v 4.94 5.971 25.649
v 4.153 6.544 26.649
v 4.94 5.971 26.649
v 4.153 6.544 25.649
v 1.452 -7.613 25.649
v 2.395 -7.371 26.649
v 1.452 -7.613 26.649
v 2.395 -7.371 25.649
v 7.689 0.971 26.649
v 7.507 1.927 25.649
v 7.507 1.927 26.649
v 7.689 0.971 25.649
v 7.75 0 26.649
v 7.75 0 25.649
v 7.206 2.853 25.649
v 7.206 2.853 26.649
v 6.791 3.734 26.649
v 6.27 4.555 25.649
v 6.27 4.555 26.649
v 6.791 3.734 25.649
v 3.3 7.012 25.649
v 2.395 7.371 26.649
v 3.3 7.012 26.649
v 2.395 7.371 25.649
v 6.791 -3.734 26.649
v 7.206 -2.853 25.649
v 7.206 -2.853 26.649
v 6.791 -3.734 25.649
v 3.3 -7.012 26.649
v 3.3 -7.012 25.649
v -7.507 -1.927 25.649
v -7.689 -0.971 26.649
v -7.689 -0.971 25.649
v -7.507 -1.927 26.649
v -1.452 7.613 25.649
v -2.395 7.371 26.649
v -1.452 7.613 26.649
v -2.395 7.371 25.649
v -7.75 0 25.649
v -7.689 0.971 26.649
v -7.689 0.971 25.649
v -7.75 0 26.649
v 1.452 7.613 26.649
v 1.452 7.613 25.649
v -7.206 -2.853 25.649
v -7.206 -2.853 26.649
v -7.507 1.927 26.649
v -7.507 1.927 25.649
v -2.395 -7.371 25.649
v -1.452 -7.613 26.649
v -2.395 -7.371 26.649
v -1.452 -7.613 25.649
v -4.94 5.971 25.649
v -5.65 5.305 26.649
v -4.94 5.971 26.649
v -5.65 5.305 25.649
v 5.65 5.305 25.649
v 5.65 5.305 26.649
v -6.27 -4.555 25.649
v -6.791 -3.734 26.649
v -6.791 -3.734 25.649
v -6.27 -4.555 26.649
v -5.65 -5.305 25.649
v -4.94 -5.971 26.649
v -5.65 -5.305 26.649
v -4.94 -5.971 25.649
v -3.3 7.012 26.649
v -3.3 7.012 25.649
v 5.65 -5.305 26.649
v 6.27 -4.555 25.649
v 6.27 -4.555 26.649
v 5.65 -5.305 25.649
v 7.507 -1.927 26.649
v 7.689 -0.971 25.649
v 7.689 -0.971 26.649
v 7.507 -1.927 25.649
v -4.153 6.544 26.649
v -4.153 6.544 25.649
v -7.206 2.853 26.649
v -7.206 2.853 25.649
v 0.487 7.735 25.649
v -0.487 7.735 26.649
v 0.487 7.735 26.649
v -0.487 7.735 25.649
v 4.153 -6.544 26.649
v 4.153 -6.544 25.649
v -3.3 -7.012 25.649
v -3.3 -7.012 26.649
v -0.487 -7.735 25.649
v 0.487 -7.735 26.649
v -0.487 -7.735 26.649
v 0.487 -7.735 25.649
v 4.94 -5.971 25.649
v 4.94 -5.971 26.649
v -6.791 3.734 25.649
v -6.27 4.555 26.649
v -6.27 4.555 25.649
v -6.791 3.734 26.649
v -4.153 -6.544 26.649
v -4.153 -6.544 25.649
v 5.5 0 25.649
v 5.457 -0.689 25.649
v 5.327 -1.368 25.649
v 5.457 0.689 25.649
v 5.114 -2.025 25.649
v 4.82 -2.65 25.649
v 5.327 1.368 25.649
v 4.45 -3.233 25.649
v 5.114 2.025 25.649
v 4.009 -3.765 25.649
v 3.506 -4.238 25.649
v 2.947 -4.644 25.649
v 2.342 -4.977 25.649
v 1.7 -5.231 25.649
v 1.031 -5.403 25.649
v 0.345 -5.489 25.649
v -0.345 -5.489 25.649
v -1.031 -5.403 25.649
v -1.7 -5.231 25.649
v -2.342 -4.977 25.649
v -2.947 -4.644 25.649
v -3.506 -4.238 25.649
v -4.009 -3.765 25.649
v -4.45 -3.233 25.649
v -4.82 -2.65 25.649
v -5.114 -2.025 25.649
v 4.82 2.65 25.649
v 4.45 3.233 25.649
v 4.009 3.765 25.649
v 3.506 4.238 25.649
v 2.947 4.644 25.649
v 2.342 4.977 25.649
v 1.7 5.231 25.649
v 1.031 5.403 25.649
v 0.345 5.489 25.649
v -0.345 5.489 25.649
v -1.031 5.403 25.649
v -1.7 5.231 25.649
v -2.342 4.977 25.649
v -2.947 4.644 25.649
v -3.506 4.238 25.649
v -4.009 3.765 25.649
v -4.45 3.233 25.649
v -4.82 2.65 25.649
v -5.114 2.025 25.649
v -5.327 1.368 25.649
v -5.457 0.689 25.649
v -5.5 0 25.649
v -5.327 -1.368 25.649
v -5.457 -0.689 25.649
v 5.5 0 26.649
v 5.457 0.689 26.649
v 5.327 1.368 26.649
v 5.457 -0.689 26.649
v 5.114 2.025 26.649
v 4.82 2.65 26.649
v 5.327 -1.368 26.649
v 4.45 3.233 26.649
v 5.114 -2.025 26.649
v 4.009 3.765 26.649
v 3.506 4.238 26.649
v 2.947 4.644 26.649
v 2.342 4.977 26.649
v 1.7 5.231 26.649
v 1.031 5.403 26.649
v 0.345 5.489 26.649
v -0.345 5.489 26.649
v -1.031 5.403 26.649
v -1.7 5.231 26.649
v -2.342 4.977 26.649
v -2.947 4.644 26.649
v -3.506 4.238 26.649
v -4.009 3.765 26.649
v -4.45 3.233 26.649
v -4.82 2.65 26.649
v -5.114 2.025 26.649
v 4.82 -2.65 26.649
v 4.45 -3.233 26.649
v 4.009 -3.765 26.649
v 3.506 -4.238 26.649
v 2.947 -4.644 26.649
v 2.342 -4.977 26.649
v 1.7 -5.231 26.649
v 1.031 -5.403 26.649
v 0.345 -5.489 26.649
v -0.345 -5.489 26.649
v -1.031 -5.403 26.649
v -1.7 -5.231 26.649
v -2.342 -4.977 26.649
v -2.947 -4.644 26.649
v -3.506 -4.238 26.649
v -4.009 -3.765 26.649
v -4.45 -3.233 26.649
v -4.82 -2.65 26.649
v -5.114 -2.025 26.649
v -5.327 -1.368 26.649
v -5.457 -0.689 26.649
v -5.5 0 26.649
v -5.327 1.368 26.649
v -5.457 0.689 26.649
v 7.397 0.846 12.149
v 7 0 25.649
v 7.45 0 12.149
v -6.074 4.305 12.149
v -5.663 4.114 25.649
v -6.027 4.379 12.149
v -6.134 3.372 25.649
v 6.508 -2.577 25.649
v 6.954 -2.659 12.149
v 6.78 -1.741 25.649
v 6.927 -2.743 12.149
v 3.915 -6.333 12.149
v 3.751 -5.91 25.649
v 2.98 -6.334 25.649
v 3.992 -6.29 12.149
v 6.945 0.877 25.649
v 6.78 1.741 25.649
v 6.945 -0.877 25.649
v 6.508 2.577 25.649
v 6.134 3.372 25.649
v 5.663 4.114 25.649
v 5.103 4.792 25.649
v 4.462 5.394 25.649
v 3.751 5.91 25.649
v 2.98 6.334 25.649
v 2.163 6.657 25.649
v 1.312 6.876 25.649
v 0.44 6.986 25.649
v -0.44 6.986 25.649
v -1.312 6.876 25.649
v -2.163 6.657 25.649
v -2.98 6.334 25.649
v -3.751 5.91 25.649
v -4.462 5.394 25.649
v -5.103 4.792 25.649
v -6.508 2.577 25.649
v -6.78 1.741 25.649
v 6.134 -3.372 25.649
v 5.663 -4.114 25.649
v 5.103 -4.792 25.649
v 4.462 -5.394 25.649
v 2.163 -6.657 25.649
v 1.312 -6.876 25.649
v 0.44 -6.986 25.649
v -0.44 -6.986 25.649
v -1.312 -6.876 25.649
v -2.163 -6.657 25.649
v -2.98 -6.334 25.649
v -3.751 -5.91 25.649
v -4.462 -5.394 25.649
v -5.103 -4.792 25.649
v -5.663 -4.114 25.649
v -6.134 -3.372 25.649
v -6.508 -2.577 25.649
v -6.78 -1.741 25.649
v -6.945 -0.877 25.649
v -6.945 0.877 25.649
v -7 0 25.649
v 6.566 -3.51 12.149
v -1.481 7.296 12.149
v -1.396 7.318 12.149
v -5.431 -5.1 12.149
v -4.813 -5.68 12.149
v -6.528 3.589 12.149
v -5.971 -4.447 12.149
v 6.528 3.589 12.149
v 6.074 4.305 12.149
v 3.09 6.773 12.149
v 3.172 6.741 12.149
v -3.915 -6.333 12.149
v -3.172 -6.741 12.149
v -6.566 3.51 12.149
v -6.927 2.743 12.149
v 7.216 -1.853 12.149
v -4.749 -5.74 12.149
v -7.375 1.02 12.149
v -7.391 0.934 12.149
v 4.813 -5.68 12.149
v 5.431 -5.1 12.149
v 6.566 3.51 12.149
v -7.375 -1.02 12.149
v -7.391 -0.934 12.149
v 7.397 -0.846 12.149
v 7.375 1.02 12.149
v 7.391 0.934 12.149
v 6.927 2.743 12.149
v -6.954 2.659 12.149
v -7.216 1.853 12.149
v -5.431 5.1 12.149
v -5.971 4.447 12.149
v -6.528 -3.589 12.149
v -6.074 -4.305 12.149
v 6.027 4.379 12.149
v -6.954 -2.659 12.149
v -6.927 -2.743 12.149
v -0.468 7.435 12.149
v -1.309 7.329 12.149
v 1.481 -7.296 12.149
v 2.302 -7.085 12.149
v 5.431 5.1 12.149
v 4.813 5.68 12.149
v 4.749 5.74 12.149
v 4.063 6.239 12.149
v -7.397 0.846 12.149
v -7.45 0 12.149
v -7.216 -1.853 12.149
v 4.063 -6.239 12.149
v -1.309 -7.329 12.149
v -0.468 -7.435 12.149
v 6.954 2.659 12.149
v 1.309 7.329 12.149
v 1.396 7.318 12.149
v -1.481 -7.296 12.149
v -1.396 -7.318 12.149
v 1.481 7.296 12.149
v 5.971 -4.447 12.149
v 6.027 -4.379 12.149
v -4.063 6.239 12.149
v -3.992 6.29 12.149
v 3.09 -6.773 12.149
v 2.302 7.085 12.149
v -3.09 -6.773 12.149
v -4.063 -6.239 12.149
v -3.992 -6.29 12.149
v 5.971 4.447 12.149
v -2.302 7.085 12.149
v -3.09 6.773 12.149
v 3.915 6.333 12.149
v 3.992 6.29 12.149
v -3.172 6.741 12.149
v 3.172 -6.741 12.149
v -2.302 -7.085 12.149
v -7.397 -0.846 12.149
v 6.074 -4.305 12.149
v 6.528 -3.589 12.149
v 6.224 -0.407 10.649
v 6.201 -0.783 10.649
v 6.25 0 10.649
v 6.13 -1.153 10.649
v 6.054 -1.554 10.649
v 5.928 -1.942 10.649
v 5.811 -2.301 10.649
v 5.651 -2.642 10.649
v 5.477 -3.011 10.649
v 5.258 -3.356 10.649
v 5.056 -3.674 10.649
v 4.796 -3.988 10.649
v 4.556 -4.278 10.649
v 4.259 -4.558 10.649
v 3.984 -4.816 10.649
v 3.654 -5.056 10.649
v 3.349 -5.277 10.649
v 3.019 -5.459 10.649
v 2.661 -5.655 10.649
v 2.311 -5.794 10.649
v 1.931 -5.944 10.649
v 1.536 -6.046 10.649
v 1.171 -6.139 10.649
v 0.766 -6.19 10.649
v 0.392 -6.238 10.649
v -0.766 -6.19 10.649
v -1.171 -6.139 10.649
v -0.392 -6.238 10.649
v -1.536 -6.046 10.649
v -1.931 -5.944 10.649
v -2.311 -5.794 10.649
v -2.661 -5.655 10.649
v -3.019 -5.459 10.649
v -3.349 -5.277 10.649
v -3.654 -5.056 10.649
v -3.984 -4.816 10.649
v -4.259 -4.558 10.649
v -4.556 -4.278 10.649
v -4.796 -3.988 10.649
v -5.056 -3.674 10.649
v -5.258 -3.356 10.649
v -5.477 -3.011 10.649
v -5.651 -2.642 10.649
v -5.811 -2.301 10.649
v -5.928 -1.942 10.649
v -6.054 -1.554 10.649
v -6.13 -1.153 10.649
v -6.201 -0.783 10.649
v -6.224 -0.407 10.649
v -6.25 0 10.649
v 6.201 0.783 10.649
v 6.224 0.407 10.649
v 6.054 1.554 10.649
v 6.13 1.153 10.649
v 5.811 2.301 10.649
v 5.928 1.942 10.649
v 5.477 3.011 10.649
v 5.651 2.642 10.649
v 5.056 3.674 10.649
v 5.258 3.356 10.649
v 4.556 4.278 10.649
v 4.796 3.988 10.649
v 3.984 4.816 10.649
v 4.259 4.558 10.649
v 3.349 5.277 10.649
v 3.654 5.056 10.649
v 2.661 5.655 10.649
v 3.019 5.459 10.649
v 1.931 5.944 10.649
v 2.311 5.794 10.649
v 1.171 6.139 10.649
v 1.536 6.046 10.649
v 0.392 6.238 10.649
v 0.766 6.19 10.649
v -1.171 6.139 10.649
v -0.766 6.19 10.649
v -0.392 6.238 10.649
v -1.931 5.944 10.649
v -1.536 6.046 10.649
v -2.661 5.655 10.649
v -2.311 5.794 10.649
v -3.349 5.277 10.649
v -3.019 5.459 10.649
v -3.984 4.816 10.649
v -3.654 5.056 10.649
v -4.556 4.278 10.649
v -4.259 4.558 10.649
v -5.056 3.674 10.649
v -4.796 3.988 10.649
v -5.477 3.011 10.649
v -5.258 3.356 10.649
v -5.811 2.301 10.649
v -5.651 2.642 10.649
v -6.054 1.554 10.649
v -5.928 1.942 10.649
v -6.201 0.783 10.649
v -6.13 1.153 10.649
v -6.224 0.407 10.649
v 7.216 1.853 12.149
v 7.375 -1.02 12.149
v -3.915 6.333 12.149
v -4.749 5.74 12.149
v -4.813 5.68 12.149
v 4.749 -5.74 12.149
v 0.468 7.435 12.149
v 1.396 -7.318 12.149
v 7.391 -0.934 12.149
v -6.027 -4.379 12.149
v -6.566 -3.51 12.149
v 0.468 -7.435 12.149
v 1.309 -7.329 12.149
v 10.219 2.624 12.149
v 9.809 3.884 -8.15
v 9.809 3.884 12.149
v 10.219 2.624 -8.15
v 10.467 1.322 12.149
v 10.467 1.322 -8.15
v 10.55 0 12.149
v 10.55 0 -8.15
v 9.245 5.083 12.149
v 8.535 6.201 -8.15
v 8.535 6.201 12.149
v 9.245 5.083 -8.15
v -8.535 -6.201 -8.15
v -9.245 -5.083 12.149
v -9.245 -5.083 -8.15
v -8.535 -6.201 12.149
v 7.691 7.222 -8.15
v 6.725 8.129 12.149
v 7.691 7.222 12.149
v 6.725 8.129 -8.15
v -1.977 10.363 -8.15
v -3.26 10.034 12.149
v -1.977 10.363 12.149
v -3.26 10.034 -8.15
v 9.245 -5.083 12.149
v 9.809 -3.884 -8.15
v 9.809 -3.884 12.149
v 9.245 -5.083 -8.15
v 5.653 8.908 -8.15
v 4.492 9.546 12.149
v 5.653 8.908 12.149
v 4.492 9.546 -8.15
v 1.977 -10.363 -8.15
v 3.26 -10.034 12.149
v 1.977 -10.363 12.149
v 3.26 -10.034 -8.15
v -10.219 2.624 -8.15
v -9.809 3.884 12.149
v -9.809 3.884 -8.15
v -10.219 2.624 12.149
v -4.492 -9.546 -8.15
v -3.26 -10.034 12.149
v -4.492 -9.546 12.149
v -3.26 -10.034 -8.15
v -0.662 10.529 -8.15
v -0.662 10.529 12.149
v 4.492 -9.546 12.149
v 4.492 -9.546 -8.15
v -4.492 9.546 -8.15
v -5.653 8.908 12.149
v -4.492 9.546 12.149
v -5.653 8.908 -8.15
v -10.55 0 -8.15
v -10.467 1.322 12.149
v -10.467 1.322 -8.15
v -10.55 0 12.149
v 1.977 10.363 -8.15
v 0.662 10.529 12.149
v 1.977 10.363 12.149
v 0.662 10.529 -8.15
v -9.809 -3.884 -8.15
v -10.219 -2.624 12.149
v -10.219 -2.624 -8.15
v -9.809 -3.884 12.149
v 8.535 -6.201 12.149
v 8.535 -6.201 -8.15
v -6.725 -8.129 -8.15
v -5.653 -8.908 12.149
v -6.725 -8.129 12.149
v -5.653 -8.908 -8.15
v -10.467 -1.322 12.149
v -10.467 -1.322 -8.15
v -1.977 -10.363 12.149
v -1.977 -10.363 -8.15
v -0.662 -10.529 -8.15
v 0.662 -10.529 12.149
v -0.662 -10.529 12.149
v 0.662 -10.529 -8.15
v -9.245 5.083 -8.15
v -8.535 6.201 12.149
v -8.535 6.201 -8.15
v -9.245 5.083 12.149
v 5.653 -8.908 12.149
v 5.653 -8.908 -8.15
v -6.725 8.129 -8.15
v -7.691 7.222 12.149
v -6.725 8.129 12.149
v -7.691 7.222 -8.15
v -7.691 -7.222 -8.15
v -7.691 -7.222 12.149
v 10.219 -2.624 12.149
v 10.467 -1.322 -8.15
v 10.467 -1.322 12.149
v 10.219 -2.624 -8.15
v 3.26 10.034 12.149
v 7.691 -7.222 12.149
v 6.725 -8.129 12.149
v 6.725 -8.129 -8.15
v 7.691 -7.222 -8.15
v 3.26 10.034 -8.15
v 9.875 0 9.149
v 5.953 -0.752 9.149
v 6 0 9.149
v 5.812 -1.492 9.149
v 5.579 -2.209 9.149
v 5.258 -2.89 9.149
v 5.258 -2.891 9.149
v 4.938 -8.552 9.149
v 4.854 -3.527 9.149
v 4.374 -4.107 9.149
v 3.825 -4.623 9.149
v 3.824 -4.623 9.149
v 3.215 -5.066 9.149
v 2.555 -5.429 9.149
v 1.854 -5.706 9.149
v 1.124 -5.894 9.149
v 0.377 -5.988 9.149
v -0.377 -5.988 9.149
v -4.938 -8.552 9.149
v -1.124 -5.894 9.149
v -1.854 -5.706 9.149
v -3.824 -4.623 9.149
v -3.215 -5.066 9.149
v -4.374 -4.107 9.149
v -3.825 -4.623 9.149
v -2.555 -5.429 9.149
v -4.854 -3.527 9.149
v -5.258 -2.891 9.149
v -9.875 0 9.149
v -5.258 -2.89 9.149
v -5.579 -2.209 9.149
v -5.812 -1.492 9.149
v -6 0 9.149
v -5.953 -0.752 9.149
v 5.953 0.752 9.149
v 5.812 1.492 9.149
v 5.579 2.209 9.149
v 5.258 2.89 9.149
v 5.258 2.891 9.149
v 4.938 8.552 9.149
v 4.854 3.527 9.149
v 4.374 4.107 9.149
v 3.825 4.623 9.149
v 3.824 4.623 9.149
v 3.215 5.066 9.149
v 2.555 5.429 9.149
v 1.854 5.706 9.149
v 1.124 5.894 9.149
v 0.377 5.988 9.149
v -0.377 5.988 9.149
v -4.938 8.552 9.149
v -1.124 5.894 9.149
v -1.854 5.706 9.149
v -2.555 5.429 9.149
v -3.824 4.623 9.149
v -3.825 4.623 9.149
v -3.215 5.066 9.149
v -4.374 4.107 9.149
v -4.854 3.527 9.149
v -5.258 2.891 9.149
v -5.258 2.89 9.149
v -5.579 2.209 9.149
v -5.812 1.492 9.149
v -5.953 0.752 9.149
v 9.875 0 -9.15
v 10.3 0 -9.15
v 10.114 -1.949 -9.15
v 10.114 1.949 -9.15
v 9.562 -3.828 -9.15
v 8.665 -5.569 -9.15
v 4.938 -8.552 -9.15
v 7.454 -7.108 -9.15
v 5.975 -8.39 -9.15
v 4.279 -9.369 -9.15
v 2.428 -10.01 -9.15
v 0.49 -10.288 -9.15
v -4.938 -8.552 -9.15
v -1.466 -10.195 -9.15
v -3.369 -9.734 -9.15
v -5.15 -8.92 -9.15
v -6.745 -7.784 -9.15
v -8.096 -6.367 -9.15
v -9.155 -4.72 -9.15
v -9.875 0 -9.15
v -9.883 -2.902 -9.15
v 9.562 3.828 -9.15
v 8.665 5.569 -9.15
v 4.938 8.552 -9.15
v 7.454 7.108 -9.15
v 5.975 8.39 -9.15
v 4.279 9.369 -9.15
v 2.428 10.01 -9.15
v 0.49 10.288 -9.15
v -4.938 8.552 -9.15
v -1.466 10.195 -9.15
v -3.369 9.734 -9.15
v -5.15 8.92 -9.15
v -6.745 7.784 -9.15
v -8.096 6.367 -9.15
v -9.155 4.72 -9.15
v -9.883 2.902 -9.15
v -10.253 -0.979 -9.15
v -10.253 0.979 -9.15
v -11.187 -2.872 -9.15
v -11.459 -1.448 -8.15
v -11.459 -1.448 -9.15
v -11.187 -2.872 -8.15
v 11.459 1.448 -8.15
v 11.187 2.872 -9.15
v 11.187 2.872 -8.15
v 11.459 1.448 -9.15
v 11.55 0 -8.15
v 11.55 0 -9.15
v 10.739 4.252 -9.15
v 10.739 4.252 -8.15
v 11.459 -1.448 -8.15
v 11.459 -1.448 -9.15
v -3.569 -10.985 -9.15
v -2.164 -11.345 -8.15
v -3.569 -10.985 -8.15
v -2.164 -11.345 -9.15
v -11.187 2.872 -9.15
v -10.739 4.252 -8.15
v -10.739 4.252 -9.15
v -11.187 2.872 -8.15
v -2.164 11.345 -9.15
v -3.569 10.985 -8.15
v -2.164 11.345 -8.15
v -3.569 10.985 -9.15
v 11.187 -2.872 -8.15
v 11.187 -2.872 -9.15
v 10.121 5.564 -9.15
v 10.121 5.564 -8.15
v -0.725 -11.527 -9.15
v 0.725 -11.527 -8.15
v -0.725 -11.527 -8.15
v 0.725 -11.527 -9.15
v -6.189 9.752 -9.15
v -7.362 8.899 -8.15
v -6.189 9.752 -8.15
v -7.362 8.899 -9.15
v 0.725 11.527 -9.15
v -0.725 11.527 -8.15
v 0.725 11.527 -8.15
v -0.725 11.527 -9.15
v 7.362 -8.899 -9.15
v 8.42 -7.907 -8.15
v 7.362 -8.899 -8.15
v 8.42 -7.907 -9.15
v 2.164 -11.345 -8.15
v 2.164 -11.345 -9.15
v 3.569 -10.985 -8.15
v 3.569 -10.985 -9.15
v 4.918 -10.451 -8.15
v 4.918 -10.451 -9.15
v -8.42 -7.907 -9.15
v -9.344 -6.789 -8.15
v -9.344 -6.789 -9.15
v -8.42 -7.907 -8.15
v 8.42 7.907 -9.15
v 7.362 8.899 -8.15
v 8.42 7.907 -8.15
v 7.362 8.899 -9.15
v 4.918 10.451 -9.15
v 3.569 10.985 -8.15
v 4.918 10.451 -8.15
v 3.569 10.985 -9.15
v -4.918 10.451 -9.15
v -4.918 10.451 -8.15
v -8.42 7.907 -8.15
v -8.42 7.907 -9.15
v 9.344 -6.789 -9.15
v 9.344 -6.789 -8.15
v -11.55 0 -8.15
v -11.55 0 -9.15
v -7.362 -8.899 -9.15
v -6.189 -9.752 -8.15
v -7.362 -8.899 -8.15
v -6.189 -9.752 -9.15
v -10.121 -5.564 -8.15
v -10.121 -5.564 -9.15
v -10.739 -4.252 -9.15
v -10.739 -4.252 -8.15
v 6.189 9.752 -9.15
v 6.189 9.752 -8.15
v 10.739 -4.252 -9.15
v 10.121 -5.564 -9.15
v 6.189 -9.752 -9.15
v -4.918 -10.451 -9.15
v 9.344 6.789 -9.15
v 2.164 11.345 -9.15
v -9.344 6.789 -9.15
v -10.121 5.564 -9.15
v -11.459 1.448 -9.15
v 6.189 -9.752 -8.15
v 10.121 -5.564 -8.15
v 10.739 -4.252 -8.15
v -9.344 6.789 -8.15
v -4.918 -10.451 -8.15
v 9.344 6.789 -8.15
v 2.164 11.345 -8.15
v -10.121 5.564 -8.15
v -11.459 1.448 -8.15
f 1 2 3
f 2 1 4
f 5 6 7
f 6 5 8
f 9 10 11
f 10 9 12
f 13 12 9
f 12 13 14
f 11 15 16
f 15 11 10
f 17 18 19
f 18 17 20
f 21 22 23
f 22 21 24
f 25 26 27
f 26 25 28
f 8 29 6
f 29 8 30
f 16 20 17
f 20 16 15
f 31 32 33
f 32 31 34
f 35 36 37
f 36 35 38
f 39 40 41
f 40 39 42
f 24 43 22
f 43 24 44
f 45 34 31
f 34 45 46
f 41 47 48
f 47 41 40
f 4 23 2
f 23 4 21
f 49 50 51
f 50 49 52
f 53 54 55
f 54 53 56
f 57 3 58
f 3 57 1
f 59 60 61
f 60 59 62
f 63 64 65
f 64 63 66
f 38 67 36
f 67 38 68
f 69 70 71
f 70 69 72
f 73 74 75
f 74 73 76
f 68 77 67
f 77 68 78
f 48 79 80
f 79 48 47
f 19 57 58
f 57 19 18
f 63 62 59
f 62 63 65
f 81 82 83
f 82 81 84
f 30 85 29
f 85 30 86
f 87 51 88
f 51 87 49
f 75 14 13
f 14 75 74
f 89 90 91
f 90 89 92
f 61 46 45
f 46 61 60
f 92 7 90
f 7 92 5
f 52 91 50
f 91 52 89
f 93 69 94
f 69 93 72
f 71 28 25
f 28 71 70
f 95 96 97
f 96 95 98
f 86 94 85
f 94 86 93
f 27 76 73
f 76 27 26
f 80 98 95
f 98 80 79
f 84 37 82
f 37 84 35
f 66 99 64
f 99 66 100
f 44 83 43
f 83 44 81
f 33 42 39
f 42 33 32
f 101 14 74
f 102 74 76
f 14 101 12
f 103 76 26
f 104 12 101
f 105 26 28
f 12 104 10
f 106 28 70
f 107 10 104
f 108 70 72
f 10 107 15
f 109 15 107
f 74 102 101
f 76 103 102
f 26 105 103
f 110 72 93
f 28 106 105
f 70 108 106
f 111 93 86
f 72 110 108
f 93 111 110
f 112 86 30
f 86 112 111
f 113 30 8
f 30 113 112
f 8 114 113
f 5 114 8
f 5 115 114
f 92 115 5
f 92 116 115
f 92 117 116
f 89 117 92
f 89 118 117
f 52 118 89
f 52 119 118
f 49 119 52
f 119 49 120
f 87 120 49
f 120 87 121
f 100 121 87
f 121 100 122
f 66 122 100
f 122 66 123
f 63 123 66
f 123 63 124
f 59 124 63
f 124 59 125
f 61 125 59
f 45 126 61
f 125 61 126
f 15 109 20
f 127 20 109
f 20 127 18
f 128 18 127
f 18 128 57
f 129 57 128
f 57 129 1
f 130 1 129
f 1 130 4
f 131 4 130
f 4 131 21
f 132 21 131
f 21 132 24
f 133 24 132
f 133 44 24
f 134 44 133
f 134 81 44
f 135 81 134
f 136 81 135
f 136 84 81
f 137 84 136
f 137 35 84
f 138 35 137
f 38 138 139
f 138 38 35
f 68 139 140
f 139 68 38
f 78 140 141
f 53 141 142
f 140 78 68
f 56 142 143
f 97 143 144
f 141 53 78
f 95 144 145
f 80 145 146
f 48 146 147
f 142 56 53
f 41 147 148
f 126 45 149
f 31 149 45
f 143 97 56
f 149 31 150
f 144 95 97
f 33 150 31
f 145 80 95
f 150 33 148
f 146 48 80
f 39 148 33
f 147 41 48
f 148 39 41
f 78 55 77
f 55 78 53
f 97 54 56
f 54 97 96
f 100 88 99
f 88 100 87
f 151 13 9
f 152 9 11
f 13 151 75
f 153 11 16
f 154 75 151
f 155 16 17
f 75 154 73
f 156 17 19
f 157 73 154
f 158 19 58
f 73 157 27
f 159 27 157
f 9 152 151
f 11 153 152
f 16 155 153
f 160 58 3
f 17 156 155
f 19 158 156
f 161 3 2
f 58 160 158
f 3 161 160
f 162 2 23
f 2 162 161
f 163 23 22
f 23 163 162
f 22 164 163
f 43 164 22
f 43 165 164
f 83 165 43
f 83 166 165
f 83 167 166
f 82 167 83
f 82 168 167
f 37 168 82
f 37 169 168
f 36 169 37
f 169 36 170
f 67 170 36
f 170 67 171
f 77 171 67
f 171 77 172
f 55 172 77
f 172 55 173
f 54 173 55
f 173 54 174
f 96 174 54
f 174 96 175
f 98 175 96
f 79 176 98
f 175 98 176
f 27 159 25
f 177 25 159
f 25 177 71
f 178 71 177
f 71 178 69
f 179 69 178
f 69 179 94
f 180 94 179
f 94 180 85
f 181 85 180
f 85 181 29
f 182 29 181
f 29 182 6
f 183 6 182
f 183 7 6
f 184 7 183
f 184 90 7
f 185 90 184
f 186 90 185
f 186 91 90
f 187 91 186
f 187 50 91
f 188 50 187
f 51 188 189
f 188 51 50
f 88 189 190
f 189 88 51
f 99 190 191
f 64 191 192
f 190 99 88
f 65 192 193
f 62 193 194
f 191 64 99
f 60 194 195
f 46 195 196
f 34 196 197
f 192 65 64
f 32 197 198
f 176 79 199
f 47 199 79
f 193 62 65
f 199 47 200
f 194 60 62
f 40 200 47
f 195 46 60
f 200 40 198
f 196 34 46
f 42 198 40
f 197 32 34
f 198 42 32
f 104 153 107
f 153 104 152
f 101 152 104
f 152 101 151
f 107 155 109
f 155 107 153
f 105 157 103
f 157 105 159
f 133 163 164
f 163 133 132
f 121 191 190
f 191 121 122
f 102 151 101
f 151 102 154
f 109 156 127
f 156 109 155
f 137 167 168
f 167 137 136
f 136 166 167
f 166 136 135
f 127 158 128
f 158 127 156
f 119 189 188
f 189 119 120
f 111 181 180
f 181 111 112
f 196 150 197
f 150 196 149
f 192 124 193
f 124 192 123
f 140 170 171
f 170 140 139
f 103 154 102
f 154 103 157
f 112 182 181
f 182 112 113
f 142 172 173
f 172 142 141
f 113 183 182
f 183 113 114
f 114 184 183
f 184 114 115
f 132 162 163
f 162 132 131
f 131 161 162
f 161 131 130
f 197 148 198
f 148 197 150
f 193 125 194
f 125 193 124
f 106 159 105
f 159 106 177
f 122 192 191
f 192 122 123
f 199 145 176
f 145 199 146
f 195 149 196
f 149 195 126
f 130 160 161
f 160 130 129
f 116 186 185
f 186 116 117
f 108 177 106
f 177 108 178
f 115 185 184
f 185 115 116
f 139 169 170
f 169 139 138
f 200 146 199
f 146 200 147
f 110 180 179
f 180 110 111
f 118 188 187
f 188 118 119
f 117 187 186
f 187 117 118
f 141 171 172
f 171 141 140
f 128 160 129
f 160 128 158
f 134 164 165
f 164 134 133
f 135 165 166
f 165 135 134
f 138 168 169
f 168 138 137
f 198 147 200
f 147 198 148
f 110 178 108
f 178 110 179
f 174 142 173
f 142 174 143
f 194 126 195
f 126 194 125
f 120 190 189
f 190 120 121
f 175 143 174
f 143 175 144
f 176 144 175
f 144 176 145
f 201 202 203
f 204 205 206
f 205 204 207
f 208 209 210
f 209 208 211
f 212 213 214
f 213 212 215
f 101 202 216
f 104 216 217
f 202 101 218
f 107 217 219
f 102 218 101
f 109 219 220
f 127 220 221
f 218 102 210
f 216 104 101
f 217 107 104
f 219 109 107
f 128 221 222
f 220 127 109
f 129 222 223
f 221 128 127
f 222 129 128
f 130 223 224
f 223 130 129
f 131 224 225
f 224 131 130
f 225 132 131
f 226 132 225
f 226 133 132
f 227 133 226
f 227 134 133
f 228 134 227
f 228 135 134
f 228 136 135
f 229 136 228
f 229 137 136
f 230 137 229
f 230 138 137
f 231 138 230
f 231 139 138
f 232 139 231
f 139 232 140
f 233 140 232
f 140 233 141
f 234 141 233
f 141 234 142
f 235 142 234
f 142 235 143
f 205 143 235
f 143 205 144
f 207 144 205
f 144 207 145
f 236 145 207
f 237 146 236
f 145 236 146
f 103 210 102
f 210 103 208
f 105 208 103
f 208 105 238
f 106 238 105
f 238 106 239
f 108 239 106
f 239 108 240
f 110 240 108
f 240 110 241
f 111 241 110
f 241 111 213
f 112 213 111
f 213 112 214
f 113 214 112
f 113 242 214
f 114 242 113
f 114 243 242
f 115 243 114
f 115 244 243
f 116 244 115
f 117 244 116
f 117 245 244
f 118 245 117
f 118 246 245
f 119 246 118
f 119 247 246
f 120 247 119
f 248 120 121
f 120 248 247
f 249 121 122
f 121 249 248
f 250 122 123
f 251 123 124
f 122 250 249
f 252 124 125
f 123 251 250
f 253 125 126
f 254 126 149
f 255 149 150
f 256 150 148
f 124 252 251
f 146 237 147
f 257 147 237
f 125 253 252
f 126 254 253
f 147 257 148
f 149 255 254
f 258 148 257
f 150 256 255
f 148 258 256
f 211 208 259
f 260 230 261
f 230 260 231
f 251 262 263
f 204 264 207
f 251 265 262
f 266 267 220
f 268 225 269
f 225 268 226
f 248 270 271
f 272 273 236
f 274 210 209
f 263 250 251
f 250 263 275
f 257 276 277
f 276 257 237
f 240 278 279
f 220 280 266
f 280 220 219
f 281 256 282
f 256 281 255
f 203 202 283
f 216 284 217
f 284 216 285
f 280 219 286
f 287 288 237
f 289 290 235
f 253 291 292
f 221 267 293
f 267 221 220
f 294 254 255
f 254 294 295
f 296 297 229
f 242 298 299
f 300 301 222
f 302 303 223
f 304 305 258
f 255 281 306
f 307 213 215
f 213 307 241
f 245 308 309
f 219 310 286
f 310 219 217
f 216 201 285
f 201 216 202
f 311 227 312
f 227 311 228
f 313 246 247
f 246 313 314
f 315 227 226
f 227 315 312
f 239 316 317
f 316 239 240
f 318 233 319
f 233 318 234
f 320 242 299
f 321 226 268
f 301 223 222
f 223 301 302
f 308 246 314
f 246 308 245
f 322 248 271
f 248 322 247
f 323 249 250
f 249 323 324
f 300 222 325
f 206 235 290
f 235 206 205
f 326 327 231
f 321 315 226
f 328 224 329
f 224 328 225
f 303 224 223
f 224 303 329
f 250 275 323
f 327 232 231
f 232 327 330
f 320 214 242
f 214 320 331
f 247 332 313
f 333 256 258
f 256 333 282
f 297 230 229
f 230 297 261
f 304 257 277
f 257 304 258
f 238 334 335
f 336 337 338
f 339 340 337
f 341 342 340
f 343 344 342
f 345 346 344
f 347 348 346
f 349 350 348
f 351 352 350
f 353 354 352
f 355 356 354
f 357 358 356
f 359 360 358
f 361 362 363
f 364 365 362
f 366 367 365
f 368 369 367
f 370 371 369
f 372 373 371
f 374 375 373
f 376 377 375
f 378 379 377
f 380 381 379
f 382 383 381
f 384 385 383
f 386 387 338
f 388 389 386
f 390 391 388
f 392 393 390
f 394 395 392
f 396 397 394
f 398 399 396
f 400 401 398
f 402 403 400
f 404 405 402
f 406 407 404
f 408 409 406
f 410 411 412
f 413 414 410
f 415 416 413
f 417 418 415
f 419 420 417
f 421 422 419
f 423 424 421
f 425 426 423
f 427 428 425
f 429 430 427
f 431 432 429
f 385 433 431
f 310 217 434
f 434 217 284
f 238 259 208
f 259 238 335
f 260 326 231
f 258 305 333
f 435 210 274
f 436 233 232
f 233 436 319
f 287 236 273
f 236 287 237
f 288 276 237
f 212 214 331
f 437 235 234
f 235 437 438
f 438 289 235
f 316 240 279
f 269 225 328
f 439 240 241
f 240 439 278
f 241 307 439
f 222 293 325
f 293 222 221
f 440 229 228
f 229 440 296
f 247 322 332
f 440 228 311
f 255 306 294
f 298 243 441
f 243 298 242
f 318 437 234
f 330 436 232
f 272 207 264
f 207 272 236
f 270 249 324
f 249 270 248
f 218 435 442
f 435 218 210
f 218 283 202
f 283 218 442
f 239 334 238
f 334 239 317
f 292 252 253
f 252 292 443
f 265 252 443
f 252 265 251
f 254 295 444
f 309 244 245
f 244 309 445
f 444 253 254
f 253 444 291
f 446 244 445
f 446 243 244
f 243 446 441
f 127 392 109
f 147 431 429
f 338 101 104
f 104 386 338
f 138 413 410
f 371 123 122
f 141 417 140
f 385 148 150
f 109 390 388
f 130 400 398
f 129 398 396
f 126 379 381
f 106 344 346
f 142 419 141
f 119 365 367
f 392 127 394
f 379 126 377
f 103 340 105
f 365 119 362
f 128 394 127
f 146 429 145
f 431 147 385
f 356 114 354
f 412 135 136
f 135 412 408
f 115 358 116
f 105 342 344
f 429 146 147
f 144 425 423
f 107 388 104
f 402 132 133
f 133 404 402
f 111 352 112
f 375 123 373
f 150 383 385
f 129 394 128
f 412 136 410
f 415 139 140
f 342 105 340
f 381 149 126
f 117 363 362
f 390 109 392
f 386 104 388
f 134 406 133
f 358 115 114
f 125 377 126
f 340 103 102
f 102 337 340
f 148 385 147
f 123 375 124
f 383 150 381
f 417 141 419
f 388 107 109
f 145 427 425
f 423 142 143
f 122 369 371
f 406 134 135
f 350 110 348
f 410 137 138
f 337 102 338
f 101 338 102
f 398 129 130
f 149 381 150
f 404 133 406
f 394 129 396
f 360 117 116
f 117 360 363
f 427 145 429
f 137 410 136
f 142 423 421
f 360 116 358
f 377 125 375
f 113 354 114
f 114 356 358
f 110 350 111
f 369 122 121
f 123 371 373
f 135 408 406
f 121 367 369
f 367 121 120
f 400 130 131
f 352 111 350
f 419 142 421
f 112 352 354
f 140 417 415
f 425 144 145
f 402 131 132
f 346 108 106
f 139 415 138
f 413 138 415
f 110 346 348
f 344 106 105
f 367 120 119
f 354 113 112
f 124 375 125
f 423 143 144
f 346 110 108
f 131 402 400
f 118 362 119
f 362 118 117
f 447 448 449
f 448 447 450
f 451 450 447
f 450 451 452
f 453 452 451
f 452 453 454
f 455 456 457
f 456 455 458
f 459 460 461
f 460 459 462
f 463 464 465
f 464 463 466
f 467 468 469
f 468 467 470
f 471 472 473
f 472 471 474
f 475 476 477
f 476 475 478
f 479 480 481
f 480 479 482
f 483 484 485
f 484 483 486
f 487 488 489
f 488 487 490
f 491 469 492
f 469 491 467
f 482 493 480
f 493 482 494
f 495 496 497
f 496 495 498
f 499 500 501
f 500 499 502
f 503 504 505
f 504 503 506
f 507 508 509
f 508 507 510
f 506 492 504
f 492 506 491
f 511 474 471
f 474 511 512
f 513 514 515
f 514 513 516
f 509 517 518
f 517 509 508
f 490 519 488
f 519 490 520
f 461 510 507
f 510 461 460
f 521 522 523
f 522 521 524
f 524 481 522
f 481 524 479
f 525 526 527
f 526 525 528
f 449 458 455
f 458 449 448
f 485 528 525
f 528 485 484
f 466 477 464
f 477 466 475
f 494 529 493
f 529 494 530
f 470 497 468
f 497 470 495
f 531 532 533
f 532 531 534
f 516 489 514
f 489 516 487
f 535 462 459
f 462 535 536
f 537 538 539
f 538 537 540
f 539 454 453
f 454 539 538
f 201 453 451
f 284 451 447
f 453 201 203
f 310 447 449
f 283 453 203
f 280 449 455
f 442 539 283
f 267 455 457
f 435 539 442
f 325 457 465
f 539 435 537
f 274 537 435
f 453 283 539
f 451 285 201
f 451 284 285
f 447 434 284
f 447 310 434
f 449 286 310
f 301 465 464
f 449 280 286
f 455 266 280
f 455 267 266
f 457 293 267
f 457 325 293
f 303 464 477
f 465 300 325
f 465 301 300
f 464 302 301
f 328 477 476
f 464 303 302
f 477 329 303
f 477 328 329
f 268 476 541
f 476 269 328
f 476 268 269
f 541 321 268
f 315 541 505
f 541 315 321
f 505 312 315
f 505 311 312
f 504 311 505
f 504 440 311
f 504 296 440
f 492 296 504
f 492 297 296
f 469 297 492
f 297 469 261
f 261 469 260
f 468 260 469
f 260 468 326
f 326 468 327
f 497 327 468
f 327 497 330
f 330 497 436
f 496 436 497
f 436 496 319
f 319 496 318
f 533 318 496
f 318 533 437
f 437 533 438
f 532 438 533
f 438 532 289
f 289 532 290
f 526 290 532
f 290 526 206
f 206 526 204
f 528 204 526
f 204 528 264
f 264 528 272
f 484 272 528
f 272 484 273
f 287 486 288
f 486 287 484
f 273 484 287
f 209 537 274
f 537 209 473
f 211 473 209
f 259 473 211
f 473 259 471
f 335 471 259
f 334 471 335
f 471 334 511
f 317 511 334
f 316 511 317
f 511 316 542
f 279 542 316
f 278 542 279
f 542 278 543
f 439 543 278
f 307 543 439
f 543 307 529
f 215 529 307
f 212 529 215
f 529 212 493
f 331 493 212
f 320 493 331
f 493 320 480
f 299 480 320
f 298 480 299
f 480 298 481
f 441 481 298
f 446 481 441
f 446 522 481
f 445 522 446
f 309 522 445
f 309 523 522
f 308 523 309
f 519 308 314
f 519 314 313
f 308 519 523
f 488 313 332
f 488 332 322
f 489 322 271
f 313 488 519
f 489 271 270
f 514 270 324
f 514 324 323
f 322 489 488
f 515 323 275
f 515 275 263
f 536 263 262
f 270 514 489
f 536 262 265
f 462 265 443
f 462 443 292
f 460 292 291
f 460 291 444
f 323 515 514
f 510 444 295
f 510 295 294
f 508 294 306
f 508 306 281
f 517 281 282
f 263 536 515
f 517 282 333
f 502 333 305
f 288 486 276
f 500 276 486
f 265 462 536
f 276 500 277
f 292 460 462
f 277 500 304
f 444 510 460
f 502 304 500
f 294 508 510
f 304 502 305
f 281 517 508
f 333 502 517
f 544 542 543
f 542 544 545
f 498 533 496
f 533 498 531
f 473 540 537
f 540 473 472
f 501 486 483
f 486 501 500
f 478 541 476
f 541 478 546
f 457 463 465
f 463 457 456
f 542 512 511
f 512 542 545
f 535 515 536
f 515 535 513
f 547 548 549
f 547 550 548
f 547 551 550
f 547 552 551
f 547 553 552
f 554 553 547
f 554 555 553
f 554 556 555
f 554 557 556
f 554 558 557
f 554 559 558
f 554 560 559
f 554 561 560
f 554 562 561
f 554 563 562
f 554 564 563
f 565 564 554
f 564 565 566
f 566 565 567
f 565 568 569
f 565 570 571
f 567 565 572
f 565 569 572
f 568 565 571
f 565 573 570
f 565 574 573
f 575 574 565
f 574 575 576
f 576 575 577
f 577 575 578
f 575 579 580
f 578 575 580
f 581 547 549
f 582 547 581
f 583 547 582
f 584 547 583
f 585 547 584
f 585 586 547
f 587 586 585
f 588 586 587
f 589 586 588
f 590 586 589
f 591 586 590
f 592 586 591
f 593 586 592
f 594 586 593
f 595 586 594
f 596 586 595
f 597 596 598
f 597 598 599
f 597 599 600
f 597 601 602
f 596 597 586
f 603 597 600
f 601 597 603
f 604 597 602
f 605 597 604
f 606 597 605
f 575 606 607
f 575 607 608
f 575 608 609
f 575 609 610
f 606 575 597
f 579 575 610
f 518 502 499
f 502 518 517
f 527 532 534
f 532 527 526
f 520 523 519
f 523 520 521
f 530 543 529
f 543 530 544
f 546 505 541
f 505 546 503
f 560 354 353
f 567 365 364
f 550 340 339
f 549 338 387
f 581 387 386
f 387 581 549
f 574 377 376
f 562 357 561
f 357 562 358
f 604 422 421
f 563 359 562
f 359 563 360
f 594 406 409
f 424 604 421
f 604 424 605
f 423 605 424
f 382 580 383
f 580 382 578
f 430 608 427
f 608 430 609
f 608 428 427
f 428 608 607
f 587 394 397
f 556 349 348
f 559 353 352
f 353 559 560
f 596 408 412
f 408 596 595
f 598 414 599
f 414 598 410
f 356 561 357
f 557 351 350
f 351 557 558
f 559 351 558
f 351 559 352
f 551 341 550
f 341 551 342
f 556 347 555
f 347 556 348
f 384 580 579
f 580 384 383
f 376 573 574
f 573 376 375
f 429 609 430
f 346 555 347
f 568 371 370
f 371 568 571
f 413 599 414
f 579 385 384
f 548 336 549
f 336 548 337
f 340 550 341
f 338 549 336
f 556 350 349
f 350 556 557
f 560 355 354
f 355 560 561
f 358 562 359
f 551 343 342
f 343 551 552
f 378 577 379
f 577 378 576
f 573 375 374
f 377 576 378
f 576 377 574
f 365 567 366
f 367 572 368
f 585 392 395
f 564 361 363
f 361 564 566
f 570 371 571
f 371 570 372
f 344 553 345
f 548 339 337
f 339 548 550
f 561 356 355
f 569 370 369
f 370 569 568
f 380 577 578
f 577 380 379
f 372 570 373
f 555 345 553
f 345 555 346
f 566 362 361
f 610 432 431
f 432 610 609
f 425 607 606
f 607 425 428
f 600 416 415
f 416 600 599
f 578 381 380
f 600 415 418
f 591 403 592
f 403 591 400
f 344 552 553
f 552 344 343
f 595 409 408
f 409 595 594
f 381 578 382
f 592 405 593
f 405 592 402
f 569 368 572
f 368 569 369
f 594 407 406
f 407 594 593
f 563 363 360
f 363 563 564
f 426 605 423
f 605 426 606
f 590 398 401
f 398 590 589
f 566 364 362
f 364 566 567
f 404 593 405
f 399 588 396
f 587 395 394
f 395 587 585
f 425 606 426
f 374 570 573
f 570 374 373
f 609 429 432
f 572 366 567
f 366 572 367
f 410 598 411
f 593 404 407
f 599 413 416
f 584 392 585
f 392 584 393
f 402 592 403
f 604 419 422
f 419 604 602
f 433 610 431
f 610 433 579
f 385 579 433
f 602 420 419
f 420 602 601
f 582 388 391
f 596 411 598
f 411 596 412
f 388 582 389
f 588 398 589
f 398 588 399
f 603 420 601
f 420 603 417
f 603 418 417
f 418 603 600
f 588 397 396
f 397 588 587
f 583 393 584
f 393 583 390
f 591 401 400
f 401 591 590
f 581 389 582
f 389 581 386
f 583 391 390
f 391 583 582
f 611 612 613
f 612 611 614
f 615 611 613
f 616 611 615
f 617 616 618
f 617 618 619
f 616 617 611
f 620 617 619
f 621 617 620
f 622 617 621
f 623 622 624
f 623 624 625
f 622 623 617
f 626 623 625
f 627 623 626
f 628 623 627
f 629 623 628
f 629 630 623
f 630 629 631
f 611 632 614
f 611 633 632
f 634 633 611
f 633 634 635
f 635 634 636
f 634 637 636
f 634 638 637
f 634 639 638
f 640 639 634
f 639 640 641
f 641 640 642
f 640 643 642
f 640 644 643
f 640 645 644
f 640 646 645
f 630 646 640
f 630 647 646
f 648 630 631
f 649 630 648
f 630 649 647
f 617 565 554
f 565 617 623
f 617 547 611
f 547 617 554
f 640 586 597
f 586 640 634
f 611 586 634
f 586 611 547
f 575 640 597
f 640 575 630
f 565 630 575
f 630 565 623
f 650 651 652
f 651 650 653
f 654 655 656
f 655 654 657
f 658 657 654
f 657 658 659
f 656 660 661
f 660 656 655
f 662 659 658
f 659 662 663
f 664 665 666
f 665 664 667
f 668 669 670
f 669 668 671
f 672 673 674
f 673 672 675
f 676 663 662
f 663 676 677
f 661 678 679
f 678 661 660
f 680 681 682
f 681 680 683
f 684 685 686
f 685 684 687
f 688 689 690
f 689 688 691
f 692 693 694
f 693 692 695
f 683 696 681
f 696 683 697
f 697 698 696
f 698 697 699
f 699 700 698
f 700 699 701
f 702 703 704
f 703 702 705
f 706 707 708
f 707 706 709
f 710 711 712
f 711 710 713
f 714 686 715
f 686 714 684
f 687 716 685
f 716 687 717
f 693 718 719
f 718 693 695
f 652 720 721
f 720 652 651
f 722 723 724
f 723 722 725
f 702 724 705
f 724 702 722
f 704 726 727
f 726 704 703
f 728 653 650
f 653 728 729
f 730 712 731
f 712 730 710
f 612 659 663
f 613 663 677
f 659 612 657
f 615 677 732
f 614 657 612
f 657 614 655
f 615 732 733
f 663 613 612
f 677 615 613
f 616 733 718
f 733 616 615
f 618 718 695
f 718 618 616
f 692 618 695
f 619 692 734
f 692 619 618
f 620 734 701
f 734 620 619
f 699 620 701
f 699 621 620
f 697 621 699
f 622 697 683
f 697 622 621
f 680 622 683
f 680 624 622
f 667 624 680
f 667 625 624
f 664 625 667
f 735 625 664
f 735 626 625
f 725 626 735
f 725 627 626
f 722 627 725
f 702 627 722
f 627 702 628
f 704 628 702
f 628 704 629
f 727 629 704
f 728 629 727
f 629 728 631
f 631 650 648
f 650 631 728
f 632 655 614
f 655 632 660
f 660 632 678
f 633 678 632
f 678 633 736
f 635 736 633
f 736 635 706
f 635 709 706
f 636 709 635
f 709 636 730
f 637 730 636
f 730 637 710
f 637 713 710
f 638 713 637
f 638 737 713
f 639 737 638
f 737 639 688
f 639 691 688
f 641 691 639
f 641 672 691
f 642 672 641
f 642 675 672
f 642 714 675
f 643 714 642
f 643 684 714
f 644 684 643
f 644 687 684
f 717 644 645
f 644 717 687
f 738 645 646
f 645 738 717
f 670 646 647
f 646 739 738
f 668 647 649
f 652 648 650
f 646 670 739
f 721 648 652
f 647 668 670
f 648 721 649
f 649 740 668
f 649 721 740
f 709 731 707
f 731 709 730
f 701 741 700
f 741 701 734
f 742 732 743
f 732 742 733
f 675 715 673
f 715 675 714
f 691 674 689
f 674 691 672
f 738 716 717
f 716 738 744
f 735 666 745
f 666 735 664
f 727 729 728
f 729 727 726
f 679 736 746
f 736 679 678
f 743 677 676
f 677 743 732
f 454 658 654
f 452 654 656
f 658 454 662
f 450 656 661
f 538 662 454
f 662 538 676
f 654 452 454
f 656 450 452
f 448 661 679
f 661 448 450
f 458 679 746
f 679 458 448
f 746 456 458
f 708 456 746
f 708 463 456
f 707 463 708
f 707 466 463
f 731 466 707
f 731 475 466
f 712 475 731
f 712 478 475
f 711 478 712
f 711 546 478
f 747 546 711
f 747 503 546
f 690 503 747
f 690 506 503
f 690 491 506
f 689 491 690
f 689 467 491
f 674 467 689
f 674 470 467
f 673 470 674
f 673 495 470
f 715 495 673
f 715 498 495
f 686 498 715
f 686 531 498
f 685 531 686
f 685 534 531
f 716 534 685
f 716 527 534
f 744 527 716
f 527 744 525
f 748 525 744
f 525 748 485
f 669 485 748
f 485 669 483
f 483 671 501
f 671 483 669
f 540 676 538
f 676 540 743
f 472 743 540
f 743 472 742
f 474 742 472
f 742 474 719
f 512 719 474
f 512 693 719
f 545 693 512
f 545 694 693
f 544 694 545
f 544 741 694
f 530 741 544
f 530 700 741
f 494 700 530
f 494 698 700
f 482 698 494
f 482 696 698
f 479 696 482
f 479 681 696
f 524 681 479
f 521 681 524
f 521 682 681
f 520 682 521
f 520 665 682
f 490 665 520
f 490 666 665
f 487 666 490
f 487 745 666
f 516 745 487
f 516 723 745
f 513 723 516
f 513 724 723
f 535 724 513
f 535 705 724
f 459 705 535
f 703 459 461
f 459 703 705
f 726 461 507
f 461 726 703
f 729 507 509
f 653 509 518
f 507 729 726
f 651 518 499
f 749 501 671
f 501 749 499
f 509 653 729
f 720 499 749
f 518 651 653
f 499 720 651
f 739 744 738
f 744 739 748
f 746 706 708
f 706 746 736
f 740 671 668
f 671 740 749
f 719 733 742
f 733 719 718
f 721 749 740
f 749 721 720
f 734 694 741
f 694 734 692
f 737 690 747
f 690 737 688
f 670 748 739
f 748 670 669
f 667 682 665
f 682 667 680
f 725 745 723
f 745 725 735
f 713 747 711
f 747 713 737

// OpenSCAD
/**
 * @file banjoSwitchCover.scad
 *
 * @version 1.0
 *
 * @author Calum Judd Anderson
 *
 * @brief The cover for the rear master cylinder banjo switch.
 */
$fa = 0.01;
INTERFERENCE_FIT = 0.001;
SLIDE_FIT = 0.5;

module banjoSwitch(banjoSwitchHexDiameter) {
    banjoSwitchTopHeight      =  3.50;
    banjoSwitchBottomHeight   =  1.30;
    banjoSwitchTopDiameter    = 14.00;
    
    banjoSwitchHexHeight      =  8.50;

    banjoSwitchBoltTopHeight    =  2.75;
    banjoSwitchBoltBottomHeight =  12.30;
    banjoSwitchBoltDiameter     =  9.80;

    banjoBleedBoltDiameter      = 8.75;
    banjoBleedBoltHeight        = 2.80;
    banjoBleedHoleDiameter      = 2.00;
    
    union() {
        /* Top */
        translate([0, 0, ((banjoSwitchHexHeight + banjoSwitchTopHeight)/2) - INTERFERENCE_FIT])
            cylinder(banjoSwitchTopHeight, d=banjoSwitchTopDiameter, center=true);
        
        /* Hex Spanner Ring */
        cylinder(banjoSwitchHexHeight, d=banjoSwitchHexDiameter, center=true, $fn=6);
        
        /* Bottom */
        translate([0, 0, (-(banjoSwitchHexHeight + banjoSwitchBottomHeight)/2) + INTERFERENCE_FIT])
            cylinder(banjoSwitchBottomHeight, d=banjoSwitchTopDiameter, center=true);
        
        /* Bolt Top */
        translate([0, 0, (-(banjoSwitchHexHeight + banjoSwitchBottomHeight + banjoSwitchBoltTopHeight)/2) + INTERFERENCE_FIT])
            cylinder(banjoSwitchBoltTopHeight, d=banjoSwitchBoltDiameter, center=true);
        
        /* Bleed */
        translate([0, 0, (-(banjoSwitchHexHeight + banjoSwitchBottomHeight + banjoSwitchBoltTopHeight)/2) + INTERFERENCE_FIT - banjoBleedBoltHeight])
            difference() {
                cylinder(banjoBleedBoltHeight, d=banjoBleedBoltDiameter, center=true);
                rotate([0, 90, 0])
                    cylinder(banjoBleedBoltDiameter + INTERFERENCE_FIT, d=banjoBleedHoleDiameter, center=true);
            }
            
        /* Bolt Bottom */
        translate([0, 0, (-(banjoSwitchHexHeight + banjoSwitchBottomHeight + banjoSwitchBoltTopHeight + banjoBleedBoltHeight)/2) + INTERFERENCE_FIT -banjoSwitchBoltBottomHeight/2 - banjoBleedBoltHeight])
            cylinder(banjoSwitchBoltBottomHeight, d=banjoSwitchBoltDiameter, center=true);
    }
}

module banjoSwitchCover(banjoSwitchHexDiameter) {
    banjoSwitchHexCoverDiameter = banjoSwitchHexDiameter + 1.85;
    banjoSwitchHexHeight        =  8.50 + 3.50 + 1.30 + 5;
    banjoSwitchHexCoverTop      =  3.00;
    
    cableCoverHeight   = 15.00;
    cableCoverDiameter = 15.00;
    
    union() {
        /* Cable Cover */
        translate([0, 0, ((banjoSwitchHexHeight + banjoSwitchHexCoverTop + 1)/2) - INTERFERENCE_FIT + cableCoverHeight])
            difference() {
                cylinder(1, d=cableCoverDiameter + 0.5, center=true, $fn=50);
                cylinder(1 + INTERFERENCE_FIT, d=cableCoverDiameter-4, center=true, $fn=50);
            }
        translate([0, 0, ((banjoSwitchHexHeight + banjoSwitchHexCoverTop + cableCoverHeight)/2) - INTERFERENCE_FIT])
            difference() {
                cylinder(cableCoverHeight, cableCoverDiameter/2, (cableCoverDiameter-1)/2, center=true, $fn=50);
                cylinder(cableCoverHeight + INTERFERENCE_FIT, (cableCoverDiameter-2.5)/2, (cableCoverDiameter-4)/2, center=true, $fn=50);
            }

        /* Top Cover */
        translate([0, 0, ((banjoSwitchHexHeight + banjoSwitchHexCoverTop)/2) - INTERFERENCE_FIT])
            difference() {
                cylinder(banjoSwitchHexCoverTop, d=banjoSwitchHexCoverDiameter, center=true, $fn=50);
                cylinder(banjoSwitchHexCoverTop + INTERFERENCE_FIT, (cableCoverDiameter-3)/2, (cableCoverDiameter-2)/2, center=true, $fn=50);
            }
            
        /* Main Body */
        difference() {
            cylinder(banjoSwitchHexHeight, d=banjoSwitchHexCoverDiameter, center=true, $fn=50);
            cylinder(banjoSwitchHexHeight + INTERFERENCE_FIT, d=(banjoSwitchHexDiameter + SLIDE_FIT), center=true, $fn=6);
        }
        
        /* Bottom Ring */
        translate([0, 0, ((1 - banjoSwitchHexHeight)/2)])
            difference() {
                cylinder(1, d=banjoSwitchHexCoverDiameter + 2, center=true, $fn=50);
                cylinder(banjoSwitchHexHeight + INTERFERENCE_FIT, d=(banjoSwitchHexCoverDiameter - SLIDE_FIT), center=true);
        }
    }
}


//banjoSwitch(16.15);

banjoSwitchCover(19.25);
